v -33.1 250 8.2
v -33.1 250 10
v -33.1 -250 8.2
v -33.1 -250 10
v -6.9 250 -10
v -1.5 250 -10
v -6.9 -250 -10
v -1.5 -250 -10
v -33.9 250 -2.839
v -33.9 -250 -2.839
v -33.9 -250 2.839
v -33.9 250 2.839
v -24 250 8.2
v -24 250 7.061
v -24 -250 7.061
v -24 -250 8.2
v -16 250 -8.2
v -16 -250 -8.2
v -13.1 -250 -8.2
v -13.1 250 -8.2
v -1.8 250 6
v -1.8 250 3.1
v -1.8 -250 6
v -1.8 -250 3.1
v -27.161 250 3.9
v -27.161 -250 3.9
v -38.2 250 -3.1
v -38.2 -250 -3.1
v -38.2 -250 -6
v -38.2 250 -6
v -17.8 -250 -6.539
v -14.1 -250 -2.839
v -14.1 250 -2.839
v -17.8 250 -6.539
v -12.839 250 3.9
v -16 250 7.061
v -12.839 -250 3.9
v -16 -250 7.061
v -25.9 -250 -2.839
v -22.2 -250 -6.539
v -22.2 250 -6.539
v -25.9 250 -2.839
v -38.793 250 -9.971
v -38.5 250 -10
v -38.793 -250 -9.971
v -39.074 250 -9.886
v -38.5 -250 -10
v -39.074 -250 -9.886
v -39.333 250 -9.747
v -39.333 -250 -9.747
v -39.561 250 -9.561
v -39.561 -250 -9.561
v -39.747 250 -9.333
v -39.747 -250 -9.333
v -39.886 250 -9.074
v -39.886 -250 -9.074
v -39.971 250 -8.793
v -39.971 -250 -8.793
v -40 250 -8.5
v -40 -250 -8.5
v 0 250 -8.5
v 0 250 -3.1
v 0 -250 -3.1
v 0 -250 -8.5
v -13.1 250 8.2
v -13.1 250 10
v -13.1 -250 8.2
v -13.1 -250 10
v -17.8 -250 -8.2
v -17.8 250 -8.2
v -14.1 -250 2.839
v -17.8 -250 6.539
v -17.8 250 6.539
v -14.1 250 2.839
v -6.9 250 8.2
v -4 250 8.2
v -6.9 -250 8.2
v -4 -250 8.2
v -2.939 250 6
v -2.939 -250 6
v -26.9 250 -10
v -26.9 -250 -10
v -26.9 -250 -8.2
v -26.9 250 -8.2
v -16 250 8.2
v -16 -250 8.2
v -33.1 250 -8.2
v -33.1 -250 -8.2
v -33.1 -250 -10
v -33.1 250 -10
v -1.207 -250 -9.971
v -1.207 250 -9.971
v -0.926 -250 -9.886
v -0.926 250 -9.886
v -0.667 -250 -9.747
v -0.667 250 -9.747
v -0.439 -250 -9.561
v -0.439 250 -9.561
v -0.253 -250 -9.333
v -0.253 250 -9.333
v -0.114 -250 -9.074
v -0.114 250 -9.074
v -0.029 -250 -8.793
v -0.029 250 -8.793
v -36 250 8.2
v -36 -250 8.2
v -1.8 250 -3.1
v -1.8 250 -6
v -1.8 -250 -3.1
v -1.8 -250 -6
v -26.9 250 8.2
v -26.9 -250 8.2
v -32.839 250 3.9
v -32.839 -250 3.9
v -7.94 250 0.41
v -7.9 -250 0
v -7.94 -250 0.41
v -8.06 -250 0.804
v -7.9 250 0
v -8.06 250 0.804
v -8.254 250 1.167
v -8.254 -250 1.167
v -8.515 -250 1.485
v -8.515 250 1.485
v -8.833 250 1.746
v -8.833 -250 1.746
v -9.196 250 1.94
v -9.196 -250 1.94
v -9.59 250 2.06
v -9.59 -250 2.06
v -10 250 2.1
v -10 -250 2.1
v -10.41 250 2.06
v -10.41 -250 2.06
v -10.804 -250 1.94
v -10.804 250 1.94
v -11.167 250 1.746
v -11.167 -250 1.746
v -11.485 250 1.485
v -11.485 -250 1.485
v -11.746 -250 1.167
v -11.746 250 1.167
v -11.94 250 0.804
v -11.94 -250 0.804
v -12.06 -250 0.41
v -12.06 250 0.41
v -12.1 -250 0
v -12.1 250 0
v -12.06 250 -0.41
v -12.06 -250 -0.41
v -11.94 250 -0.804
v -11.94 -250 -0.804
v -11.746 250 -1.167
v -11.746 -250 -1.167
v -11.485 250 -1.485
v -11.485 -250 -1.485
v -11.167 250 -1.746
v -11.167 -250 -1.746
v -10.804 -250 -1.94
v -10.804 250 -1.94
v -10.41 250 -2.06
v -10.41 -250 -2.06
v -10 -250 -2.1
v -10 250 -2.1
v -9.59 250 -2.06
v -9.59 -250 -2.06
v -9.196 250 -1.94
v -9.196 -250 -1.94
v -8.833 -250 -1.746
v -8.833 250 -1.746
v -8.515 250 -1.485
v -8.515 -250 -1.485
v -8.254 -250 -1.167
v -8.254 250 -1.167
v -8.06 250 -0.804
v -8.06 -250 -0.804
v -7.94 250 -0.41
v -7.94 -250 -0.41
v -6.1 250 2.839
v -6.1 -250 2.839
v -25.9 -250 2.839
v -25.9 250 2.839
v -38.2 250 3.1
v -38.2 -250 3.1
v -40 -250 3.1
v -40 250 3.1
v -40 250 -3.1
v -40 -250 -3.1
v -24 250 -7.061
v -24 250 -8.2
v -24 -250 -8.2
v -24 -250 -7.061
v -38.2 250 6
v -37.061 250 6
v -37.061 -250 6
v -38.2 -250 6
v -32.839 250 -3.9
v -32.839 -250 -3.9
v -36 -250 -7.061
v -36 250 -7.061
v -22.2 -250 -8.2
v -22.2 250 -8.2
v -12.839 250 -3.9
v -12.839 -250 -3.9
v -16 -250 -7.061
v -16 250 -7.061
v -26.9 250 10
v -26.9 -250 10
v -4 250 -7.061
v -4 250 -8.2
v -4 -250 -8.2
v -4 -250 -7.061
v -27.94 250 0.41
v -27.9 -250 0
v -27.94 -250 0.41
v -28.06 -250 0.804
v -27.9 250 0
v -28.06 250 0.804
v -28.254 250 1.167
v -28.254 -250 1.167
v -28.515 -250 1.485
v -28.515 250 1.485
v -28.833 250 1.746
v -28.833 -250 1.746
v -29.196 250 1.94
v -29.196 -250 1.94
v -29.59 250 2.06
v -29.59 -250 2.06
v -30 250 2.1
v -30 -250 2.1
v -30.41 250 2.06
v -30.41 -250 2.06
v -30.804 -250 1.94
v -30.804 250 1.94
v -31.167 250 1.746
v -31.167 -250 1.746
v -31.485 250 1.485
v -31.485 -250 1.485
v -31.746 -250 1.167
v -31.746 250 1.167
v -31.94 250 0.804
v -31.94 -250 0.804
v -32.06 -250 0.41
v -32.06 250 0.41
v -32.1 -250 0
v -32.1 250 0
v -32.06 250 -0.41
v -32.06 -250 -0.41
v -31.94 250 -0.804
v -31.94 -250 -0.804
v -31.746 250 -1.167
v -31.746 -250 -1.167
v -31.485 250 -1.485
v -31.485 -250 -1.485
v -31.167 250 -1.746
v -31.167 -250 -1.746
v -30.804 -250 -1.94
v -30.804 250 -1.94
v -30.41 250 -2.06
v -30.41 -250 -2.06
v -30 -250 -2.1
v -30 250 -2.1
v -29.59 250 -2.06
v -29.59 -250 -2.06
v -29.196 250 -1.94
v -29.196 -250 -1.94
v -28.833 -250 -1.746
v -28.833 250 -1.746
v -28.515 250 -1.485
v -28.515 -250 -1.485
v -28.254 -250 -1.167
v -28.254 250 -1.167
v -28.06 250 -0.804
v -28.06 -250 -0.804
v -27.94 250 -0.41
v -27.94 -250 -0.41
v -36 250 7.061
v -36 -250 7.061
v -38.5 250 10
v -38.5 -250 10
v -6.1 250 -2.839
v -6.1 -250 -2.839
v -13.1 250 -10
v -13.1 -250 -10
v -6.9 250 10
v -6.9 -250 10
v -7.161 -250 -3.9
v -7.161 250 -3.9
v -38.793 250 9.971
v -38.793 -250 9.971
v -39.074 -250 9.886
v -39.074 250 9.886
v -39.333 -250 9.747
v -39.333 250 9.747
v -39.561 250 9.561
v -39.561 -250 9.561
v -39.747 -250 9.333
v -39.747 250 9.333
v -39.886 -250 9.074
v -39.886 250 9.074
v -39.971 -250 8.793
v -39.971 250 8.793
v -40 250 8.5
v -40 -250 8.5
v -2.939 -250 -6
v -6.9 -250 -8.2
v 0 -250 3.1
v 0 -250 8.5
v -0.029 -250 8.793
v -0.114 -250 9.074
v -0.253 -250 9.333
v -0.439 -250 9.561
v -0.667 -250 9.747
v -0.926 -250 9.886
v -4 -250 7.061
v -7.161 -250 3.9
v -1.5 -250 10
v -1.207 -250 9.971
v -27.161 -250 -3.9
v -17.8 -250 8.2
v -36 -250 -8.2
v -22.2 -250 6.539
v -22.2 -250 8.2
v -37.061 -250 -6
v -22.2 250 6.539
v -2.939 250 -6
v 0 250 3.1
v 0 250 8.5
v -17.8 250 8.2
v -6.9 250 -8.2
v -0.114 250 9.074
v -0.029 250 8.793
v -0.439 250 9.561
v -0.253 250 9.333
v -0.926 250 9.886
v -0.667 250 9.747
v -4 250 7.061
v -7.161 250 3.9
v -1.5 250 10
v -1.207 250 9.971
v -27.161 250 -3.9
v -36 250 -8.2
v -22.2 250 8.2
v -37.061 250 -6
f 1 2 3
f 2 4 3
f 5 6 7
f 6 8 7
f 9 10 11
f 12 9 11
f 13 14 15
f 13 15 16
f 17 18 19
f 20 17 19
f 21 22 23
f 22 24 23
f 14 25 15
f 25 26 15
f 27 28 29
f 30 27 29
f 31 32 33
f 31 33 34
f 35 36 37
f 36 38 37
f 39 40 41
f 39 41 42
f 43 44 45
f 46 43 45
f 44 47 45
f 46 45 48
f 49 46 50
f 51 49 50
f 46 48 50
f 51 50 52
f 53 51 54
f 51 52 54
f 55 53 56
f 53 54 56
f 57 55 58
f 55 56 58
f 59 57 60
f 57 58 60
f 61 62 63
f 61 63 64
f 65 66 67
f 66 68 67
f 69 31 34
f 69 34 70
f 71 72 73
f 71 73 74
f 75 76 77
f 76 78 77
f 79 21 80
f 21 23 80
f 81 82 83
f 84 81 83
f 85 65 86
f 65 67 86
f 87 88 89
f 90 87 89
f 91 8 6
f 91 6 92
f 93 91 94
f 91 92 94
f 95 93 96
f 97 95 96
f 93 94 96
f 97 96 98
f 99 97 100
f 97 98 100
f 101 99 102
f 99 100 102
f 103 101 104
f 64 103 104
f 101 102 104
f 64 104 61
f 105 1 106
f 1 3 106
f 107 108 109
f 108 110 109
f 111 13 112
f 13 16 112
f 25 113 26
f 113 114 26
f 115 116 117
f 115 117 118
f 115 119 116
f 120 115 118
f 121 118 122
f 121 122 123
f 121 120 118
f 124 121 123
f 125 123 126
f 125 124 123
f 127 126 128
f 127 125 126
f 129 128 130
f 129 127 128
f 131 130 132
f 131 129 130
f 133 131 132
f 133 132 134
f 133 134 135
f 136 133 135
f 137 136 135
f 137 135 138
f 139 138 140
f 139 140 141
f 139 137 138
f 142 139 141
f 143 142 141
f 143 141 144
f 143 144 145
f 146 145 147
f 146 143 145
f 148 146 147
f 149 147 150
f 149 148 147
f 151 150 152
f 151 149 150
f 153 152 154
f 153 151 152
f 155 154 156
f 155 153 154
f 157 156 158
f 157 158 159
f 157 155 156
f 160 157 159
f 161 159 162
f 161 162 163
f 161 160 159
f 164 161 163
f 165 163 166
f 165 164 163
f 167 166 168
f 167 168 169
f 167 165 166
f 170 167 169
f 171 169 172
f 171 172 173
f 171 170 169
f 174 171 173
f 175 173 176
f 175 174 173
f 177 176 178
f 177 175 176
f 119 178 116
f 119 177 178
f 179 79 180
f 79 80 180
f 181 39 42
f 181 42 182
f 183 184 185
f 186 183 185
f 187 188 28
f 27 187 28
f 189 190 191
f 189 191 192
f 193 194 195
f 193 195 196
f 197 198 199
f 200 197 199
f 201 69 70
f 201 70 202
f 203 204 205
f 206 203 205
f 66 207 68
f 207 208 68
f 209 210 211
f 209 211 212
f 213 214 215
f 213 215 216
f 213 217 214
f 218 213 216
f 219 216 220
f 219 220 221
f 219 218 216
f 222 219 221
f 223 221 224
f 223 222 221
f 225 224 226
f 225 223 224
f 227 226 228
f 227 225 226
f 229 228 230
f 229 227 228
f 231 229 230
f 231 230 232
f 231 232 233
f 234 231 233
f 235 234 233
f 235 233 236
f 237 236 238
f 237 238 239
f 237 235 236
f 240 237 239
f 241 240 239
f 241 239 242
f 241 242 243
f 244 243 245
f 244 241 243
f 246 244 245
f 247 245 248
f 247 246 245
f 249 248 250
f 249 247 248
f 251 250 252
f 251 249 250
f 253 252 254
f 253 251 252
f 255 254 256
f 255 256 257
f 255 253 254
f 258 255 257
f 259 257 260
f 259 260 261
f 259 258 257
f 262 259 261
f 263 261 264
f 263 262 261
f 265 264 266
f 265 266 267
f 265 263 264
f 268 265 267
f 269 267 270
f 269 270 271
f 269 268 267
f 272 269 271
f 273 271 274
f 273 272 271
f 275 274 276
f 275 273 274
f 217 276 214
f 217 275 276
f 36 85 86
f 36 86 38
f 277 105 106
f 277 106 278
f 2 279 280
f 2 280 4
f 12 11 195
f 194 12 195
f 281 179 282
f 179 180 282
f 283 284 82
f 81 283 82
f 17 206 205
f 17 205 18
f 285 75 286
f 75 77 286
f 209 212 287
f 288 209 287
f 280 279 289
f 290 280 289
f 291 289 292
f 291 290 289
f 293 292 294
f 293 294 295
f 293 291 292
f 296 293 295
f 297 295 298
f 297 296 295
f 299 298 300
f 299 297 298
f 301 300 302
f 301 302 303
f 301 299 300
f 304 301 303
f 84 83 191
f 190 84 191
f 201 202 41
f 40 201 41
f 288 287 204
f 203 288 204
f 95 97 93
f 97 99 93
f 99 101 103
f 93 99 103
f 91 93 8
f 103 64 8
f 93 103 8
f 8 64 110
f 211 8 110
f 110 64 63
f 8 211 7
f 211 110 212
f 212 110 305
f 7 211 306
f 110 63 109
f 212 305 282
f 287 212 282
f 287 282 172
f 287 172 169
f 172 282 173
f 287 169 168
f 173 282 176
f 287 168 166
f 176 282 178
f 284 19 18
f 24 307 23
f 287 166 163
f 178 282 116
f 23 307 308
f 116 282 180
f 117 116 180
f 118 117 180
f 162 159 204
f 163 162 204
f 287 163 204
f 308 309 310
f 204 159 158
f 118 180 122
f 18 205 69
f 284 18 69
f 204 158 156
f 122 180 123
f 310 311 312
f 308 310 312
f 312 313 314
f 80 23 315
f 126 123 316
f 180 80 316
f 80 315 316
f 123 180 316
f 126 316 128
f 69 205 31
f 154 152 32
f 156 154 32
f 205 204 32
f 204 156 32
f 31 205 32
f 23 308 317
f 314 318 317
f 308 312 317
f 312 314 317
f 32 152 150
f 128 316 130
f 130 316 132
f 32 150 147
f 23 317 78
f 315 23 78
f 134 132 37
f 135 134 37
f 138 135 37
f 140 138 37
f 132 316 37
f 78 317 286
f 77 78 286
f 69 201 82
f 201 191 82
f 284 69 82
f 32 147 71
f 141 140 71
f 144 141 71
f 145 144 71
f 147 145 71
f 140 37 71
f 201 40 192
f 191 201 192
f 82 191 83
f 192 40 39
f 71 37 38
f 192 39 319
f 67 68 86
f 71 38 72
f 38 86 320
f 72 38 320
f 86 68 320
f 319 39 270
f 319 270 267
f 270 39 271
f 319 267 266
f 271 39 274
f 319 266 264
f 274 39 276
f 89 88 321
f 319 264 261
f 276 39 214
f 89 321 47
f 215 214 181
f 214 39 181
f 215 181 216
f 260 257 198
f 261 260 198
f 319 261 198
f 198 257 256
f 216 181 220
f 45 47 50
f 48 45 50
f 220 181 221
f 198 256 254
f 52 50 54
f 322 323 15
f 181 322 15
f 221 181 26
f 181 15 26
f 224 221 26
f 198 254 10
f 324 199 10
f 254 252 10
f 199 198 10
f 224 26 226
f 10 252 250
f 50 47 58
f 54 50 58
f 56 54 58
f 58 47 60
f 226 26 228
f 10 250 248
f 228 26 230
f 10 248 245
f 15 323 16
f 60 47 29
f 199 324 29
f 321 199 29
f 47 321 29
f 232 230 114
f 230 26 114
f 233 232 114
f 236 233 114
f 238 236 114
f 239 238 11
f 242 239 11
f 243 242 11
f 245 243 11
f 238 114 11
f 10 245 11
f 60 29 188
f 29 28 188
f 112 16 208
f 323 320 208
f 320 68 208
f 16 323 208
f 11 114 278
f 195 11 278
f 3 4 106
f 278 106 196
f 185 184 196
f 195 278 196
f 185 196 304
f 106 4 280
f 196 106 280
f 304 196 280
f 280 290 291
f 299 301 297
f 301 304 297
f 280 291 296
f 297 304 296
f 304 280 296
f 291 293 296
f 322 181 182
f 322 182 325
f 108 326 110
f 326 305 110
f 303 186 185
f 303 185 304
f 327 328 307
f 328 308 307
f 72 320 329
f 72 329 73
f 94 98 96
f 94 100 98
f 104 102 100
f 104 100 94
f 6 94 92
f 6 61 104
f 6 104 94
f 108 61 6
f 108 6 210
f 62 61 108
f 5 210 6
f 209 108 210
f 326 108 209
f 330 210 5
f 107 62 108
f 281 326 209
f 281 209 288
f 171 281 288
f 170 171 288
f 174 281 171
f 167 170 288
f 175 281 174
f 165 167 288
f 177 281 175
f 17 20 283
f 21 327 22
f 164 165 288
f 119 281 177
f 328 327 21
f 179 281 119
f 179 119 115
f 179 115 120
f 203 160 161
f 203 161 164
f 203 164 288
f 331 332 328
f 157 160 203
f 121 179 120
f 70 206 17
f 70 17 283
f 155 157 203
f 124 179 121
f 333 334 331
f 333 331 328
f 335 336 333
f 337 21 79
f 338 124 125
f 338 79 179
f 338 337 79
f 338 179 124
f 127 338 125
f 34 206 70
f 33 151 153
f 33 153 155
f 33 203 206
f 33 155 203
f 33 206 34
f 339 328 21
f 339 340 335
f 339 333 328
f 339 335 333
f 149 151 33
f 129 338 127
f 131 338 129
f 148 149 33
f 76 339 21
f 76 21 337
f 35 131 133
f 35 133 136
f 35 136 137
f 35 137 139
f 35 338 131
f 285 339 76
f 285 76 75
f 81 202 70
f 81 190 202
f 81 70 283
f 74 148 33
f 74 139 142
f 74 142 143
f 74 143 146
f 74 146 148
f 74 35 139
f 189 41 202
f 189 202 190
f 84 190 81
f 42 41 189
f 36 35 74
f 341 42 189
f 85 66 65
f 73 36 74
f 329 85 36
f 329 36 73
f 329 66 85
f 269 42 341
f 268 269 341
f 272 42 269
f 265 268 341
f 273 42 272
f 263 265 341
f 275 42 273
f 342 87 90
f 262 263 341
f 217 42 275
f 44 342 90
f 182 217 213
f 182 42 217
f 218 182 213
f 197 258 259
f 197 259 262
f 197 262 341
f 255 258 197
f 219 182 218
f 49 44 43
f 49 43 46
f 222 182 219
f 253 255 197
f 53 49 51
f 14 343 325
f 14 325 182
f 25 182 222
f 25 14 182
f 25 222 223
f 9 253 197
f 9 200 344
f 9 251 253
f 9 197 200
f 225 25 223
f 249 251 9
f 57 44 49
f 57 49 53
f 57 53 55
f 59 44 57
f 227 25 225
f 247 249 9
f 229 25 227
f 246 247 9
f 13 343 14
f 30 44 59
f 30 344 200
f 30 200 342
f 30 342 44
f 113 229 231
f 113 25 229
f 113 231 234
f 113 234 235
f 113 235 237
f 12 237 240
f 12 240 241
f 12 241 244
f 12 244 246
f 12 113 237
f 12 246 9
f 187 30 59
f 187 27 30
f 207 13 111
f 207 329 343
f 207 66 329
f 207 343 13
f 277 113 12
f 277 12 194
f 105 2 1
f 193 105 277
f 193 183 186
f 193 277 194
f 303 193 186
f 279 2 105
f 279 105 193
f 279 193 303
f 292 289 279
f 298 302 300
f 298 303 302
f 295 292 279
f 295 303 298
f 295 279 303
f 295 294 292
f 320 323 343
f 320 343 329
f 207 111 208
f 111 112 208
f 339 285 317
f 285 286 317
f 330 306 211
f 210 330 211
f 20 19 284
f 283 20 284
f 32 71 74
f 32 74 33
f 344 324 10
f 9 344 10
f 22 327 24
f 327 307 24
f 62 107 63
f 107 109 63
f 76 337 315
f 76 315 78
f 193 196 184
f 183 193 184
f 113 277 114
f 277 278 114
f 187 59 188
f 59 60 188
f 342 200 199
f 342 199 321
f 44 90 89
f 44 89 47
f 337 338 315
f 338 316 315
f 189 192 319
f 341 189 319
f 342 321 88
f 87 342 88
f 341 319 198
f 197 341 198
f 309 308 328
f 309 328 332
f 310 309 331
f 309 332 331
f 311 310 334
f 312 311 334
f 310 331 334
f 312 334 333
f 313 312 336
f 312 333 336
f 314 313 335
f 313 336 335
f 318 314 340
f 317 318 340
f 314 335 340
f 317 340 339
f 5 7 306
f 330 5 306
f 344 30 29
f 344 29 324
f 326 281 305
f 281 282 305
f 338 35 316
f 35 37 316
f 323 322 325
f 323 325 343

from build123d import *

# Parameters (mm, degrees)
SKETCH_R  = 2.1
PAD_DEPTH = 250
FILLET_R  = 1.5


with BuildPart() as part:
    # Sketch → Pad (new body, symmetric)
    with BuildSketch(Plane.XZ):
        Polygon((-10, 10), (-3.1, 10), (-3.1, 8.2), (-6, 8.2), (-6, 7.06066), (-2.83934, 3.9), (2.83934, 3.9), (6, 7.06066), (6, 8.2), (3.1, 8.2), (3.1, 10), (16.9, 10), (16.9, 8.2), (14, 8.2), (14, 7.06066), (17.16066, 3.9), (22.83934, 3.9), (26, 7.06066), (26, 8.2), (23.1, 8.2), (23.1, 10), (30, 10), (30, 3.1), (28.2, 3.1), (28.2, 6), (27.06066, 6), (23.9, 2.83934), (23.9, -2.83934), (27.06066, -6), (28.2, -6), (28.2, -3.1), (30, -3.1), (30, -10), (23.1, -10), (23.1, -8.2), (26, -8.2), (26, -7.06066), (22.83934, -3.9), (17.16066, -3.9), (14, -7.06066), (14, -8.2), (16.9, -8.2), (16.9, -10), (3.1, -10), (3.1, -8.2), (6, -8.2), (6, -7.06066), (2.83934, -3.9), (-2.83934, -3.9), (-6, -7.06066), (-6, -8.2), (-3.1, -8.2), (-3.1, -10), (-10, -10), (-10, -3.1), (-8.2, -3.1), (-8.2, -6), (-7.06066, -6), (-3.9, -2.83934), (-3.9, 2.83934), (-7.06066, 6), (-8.2, 6), (-8.2, 3.1), (-10, 3.1), align=None)
        Circle(SKETCH_R, mode=Mode.SUBTRACT)
        with Locations((20, 0)):
            Circle(SKETCH_R, mode=Mode.SUBTRACT)
        Polygon((7.8, -6.53934), (4.1, -2.83934), (4.1, 2.83934), (7.8, 6.53934), (7.8, 8.2), (12.2, 8.2), (12.2, 6.53934), (15.9, 2.83934), (15.9, -2.83934), (12.2, -6.53934), (12.2, -8.2), (7.8, -8.2), align=None, mode=Mode.SUBTRACT)
    extrude(amount=PAD_DEPTH, both=True)

    # Fillet
    fillet_edges = [part.edges().sort_by_distance(p)[0] for p in [
        (-10, 0, 10),
        (30, 0, 10),
        (30, 0, -10),
        (-10, 0, -10),
    ]]
    fillet(fillet_edges, radius=FILLET_R)


with BuildPart() as part_1:
    # Body placement: moved
    add(part.part.moved(Location((-30, 0, 0))))


solid = part_1.part
